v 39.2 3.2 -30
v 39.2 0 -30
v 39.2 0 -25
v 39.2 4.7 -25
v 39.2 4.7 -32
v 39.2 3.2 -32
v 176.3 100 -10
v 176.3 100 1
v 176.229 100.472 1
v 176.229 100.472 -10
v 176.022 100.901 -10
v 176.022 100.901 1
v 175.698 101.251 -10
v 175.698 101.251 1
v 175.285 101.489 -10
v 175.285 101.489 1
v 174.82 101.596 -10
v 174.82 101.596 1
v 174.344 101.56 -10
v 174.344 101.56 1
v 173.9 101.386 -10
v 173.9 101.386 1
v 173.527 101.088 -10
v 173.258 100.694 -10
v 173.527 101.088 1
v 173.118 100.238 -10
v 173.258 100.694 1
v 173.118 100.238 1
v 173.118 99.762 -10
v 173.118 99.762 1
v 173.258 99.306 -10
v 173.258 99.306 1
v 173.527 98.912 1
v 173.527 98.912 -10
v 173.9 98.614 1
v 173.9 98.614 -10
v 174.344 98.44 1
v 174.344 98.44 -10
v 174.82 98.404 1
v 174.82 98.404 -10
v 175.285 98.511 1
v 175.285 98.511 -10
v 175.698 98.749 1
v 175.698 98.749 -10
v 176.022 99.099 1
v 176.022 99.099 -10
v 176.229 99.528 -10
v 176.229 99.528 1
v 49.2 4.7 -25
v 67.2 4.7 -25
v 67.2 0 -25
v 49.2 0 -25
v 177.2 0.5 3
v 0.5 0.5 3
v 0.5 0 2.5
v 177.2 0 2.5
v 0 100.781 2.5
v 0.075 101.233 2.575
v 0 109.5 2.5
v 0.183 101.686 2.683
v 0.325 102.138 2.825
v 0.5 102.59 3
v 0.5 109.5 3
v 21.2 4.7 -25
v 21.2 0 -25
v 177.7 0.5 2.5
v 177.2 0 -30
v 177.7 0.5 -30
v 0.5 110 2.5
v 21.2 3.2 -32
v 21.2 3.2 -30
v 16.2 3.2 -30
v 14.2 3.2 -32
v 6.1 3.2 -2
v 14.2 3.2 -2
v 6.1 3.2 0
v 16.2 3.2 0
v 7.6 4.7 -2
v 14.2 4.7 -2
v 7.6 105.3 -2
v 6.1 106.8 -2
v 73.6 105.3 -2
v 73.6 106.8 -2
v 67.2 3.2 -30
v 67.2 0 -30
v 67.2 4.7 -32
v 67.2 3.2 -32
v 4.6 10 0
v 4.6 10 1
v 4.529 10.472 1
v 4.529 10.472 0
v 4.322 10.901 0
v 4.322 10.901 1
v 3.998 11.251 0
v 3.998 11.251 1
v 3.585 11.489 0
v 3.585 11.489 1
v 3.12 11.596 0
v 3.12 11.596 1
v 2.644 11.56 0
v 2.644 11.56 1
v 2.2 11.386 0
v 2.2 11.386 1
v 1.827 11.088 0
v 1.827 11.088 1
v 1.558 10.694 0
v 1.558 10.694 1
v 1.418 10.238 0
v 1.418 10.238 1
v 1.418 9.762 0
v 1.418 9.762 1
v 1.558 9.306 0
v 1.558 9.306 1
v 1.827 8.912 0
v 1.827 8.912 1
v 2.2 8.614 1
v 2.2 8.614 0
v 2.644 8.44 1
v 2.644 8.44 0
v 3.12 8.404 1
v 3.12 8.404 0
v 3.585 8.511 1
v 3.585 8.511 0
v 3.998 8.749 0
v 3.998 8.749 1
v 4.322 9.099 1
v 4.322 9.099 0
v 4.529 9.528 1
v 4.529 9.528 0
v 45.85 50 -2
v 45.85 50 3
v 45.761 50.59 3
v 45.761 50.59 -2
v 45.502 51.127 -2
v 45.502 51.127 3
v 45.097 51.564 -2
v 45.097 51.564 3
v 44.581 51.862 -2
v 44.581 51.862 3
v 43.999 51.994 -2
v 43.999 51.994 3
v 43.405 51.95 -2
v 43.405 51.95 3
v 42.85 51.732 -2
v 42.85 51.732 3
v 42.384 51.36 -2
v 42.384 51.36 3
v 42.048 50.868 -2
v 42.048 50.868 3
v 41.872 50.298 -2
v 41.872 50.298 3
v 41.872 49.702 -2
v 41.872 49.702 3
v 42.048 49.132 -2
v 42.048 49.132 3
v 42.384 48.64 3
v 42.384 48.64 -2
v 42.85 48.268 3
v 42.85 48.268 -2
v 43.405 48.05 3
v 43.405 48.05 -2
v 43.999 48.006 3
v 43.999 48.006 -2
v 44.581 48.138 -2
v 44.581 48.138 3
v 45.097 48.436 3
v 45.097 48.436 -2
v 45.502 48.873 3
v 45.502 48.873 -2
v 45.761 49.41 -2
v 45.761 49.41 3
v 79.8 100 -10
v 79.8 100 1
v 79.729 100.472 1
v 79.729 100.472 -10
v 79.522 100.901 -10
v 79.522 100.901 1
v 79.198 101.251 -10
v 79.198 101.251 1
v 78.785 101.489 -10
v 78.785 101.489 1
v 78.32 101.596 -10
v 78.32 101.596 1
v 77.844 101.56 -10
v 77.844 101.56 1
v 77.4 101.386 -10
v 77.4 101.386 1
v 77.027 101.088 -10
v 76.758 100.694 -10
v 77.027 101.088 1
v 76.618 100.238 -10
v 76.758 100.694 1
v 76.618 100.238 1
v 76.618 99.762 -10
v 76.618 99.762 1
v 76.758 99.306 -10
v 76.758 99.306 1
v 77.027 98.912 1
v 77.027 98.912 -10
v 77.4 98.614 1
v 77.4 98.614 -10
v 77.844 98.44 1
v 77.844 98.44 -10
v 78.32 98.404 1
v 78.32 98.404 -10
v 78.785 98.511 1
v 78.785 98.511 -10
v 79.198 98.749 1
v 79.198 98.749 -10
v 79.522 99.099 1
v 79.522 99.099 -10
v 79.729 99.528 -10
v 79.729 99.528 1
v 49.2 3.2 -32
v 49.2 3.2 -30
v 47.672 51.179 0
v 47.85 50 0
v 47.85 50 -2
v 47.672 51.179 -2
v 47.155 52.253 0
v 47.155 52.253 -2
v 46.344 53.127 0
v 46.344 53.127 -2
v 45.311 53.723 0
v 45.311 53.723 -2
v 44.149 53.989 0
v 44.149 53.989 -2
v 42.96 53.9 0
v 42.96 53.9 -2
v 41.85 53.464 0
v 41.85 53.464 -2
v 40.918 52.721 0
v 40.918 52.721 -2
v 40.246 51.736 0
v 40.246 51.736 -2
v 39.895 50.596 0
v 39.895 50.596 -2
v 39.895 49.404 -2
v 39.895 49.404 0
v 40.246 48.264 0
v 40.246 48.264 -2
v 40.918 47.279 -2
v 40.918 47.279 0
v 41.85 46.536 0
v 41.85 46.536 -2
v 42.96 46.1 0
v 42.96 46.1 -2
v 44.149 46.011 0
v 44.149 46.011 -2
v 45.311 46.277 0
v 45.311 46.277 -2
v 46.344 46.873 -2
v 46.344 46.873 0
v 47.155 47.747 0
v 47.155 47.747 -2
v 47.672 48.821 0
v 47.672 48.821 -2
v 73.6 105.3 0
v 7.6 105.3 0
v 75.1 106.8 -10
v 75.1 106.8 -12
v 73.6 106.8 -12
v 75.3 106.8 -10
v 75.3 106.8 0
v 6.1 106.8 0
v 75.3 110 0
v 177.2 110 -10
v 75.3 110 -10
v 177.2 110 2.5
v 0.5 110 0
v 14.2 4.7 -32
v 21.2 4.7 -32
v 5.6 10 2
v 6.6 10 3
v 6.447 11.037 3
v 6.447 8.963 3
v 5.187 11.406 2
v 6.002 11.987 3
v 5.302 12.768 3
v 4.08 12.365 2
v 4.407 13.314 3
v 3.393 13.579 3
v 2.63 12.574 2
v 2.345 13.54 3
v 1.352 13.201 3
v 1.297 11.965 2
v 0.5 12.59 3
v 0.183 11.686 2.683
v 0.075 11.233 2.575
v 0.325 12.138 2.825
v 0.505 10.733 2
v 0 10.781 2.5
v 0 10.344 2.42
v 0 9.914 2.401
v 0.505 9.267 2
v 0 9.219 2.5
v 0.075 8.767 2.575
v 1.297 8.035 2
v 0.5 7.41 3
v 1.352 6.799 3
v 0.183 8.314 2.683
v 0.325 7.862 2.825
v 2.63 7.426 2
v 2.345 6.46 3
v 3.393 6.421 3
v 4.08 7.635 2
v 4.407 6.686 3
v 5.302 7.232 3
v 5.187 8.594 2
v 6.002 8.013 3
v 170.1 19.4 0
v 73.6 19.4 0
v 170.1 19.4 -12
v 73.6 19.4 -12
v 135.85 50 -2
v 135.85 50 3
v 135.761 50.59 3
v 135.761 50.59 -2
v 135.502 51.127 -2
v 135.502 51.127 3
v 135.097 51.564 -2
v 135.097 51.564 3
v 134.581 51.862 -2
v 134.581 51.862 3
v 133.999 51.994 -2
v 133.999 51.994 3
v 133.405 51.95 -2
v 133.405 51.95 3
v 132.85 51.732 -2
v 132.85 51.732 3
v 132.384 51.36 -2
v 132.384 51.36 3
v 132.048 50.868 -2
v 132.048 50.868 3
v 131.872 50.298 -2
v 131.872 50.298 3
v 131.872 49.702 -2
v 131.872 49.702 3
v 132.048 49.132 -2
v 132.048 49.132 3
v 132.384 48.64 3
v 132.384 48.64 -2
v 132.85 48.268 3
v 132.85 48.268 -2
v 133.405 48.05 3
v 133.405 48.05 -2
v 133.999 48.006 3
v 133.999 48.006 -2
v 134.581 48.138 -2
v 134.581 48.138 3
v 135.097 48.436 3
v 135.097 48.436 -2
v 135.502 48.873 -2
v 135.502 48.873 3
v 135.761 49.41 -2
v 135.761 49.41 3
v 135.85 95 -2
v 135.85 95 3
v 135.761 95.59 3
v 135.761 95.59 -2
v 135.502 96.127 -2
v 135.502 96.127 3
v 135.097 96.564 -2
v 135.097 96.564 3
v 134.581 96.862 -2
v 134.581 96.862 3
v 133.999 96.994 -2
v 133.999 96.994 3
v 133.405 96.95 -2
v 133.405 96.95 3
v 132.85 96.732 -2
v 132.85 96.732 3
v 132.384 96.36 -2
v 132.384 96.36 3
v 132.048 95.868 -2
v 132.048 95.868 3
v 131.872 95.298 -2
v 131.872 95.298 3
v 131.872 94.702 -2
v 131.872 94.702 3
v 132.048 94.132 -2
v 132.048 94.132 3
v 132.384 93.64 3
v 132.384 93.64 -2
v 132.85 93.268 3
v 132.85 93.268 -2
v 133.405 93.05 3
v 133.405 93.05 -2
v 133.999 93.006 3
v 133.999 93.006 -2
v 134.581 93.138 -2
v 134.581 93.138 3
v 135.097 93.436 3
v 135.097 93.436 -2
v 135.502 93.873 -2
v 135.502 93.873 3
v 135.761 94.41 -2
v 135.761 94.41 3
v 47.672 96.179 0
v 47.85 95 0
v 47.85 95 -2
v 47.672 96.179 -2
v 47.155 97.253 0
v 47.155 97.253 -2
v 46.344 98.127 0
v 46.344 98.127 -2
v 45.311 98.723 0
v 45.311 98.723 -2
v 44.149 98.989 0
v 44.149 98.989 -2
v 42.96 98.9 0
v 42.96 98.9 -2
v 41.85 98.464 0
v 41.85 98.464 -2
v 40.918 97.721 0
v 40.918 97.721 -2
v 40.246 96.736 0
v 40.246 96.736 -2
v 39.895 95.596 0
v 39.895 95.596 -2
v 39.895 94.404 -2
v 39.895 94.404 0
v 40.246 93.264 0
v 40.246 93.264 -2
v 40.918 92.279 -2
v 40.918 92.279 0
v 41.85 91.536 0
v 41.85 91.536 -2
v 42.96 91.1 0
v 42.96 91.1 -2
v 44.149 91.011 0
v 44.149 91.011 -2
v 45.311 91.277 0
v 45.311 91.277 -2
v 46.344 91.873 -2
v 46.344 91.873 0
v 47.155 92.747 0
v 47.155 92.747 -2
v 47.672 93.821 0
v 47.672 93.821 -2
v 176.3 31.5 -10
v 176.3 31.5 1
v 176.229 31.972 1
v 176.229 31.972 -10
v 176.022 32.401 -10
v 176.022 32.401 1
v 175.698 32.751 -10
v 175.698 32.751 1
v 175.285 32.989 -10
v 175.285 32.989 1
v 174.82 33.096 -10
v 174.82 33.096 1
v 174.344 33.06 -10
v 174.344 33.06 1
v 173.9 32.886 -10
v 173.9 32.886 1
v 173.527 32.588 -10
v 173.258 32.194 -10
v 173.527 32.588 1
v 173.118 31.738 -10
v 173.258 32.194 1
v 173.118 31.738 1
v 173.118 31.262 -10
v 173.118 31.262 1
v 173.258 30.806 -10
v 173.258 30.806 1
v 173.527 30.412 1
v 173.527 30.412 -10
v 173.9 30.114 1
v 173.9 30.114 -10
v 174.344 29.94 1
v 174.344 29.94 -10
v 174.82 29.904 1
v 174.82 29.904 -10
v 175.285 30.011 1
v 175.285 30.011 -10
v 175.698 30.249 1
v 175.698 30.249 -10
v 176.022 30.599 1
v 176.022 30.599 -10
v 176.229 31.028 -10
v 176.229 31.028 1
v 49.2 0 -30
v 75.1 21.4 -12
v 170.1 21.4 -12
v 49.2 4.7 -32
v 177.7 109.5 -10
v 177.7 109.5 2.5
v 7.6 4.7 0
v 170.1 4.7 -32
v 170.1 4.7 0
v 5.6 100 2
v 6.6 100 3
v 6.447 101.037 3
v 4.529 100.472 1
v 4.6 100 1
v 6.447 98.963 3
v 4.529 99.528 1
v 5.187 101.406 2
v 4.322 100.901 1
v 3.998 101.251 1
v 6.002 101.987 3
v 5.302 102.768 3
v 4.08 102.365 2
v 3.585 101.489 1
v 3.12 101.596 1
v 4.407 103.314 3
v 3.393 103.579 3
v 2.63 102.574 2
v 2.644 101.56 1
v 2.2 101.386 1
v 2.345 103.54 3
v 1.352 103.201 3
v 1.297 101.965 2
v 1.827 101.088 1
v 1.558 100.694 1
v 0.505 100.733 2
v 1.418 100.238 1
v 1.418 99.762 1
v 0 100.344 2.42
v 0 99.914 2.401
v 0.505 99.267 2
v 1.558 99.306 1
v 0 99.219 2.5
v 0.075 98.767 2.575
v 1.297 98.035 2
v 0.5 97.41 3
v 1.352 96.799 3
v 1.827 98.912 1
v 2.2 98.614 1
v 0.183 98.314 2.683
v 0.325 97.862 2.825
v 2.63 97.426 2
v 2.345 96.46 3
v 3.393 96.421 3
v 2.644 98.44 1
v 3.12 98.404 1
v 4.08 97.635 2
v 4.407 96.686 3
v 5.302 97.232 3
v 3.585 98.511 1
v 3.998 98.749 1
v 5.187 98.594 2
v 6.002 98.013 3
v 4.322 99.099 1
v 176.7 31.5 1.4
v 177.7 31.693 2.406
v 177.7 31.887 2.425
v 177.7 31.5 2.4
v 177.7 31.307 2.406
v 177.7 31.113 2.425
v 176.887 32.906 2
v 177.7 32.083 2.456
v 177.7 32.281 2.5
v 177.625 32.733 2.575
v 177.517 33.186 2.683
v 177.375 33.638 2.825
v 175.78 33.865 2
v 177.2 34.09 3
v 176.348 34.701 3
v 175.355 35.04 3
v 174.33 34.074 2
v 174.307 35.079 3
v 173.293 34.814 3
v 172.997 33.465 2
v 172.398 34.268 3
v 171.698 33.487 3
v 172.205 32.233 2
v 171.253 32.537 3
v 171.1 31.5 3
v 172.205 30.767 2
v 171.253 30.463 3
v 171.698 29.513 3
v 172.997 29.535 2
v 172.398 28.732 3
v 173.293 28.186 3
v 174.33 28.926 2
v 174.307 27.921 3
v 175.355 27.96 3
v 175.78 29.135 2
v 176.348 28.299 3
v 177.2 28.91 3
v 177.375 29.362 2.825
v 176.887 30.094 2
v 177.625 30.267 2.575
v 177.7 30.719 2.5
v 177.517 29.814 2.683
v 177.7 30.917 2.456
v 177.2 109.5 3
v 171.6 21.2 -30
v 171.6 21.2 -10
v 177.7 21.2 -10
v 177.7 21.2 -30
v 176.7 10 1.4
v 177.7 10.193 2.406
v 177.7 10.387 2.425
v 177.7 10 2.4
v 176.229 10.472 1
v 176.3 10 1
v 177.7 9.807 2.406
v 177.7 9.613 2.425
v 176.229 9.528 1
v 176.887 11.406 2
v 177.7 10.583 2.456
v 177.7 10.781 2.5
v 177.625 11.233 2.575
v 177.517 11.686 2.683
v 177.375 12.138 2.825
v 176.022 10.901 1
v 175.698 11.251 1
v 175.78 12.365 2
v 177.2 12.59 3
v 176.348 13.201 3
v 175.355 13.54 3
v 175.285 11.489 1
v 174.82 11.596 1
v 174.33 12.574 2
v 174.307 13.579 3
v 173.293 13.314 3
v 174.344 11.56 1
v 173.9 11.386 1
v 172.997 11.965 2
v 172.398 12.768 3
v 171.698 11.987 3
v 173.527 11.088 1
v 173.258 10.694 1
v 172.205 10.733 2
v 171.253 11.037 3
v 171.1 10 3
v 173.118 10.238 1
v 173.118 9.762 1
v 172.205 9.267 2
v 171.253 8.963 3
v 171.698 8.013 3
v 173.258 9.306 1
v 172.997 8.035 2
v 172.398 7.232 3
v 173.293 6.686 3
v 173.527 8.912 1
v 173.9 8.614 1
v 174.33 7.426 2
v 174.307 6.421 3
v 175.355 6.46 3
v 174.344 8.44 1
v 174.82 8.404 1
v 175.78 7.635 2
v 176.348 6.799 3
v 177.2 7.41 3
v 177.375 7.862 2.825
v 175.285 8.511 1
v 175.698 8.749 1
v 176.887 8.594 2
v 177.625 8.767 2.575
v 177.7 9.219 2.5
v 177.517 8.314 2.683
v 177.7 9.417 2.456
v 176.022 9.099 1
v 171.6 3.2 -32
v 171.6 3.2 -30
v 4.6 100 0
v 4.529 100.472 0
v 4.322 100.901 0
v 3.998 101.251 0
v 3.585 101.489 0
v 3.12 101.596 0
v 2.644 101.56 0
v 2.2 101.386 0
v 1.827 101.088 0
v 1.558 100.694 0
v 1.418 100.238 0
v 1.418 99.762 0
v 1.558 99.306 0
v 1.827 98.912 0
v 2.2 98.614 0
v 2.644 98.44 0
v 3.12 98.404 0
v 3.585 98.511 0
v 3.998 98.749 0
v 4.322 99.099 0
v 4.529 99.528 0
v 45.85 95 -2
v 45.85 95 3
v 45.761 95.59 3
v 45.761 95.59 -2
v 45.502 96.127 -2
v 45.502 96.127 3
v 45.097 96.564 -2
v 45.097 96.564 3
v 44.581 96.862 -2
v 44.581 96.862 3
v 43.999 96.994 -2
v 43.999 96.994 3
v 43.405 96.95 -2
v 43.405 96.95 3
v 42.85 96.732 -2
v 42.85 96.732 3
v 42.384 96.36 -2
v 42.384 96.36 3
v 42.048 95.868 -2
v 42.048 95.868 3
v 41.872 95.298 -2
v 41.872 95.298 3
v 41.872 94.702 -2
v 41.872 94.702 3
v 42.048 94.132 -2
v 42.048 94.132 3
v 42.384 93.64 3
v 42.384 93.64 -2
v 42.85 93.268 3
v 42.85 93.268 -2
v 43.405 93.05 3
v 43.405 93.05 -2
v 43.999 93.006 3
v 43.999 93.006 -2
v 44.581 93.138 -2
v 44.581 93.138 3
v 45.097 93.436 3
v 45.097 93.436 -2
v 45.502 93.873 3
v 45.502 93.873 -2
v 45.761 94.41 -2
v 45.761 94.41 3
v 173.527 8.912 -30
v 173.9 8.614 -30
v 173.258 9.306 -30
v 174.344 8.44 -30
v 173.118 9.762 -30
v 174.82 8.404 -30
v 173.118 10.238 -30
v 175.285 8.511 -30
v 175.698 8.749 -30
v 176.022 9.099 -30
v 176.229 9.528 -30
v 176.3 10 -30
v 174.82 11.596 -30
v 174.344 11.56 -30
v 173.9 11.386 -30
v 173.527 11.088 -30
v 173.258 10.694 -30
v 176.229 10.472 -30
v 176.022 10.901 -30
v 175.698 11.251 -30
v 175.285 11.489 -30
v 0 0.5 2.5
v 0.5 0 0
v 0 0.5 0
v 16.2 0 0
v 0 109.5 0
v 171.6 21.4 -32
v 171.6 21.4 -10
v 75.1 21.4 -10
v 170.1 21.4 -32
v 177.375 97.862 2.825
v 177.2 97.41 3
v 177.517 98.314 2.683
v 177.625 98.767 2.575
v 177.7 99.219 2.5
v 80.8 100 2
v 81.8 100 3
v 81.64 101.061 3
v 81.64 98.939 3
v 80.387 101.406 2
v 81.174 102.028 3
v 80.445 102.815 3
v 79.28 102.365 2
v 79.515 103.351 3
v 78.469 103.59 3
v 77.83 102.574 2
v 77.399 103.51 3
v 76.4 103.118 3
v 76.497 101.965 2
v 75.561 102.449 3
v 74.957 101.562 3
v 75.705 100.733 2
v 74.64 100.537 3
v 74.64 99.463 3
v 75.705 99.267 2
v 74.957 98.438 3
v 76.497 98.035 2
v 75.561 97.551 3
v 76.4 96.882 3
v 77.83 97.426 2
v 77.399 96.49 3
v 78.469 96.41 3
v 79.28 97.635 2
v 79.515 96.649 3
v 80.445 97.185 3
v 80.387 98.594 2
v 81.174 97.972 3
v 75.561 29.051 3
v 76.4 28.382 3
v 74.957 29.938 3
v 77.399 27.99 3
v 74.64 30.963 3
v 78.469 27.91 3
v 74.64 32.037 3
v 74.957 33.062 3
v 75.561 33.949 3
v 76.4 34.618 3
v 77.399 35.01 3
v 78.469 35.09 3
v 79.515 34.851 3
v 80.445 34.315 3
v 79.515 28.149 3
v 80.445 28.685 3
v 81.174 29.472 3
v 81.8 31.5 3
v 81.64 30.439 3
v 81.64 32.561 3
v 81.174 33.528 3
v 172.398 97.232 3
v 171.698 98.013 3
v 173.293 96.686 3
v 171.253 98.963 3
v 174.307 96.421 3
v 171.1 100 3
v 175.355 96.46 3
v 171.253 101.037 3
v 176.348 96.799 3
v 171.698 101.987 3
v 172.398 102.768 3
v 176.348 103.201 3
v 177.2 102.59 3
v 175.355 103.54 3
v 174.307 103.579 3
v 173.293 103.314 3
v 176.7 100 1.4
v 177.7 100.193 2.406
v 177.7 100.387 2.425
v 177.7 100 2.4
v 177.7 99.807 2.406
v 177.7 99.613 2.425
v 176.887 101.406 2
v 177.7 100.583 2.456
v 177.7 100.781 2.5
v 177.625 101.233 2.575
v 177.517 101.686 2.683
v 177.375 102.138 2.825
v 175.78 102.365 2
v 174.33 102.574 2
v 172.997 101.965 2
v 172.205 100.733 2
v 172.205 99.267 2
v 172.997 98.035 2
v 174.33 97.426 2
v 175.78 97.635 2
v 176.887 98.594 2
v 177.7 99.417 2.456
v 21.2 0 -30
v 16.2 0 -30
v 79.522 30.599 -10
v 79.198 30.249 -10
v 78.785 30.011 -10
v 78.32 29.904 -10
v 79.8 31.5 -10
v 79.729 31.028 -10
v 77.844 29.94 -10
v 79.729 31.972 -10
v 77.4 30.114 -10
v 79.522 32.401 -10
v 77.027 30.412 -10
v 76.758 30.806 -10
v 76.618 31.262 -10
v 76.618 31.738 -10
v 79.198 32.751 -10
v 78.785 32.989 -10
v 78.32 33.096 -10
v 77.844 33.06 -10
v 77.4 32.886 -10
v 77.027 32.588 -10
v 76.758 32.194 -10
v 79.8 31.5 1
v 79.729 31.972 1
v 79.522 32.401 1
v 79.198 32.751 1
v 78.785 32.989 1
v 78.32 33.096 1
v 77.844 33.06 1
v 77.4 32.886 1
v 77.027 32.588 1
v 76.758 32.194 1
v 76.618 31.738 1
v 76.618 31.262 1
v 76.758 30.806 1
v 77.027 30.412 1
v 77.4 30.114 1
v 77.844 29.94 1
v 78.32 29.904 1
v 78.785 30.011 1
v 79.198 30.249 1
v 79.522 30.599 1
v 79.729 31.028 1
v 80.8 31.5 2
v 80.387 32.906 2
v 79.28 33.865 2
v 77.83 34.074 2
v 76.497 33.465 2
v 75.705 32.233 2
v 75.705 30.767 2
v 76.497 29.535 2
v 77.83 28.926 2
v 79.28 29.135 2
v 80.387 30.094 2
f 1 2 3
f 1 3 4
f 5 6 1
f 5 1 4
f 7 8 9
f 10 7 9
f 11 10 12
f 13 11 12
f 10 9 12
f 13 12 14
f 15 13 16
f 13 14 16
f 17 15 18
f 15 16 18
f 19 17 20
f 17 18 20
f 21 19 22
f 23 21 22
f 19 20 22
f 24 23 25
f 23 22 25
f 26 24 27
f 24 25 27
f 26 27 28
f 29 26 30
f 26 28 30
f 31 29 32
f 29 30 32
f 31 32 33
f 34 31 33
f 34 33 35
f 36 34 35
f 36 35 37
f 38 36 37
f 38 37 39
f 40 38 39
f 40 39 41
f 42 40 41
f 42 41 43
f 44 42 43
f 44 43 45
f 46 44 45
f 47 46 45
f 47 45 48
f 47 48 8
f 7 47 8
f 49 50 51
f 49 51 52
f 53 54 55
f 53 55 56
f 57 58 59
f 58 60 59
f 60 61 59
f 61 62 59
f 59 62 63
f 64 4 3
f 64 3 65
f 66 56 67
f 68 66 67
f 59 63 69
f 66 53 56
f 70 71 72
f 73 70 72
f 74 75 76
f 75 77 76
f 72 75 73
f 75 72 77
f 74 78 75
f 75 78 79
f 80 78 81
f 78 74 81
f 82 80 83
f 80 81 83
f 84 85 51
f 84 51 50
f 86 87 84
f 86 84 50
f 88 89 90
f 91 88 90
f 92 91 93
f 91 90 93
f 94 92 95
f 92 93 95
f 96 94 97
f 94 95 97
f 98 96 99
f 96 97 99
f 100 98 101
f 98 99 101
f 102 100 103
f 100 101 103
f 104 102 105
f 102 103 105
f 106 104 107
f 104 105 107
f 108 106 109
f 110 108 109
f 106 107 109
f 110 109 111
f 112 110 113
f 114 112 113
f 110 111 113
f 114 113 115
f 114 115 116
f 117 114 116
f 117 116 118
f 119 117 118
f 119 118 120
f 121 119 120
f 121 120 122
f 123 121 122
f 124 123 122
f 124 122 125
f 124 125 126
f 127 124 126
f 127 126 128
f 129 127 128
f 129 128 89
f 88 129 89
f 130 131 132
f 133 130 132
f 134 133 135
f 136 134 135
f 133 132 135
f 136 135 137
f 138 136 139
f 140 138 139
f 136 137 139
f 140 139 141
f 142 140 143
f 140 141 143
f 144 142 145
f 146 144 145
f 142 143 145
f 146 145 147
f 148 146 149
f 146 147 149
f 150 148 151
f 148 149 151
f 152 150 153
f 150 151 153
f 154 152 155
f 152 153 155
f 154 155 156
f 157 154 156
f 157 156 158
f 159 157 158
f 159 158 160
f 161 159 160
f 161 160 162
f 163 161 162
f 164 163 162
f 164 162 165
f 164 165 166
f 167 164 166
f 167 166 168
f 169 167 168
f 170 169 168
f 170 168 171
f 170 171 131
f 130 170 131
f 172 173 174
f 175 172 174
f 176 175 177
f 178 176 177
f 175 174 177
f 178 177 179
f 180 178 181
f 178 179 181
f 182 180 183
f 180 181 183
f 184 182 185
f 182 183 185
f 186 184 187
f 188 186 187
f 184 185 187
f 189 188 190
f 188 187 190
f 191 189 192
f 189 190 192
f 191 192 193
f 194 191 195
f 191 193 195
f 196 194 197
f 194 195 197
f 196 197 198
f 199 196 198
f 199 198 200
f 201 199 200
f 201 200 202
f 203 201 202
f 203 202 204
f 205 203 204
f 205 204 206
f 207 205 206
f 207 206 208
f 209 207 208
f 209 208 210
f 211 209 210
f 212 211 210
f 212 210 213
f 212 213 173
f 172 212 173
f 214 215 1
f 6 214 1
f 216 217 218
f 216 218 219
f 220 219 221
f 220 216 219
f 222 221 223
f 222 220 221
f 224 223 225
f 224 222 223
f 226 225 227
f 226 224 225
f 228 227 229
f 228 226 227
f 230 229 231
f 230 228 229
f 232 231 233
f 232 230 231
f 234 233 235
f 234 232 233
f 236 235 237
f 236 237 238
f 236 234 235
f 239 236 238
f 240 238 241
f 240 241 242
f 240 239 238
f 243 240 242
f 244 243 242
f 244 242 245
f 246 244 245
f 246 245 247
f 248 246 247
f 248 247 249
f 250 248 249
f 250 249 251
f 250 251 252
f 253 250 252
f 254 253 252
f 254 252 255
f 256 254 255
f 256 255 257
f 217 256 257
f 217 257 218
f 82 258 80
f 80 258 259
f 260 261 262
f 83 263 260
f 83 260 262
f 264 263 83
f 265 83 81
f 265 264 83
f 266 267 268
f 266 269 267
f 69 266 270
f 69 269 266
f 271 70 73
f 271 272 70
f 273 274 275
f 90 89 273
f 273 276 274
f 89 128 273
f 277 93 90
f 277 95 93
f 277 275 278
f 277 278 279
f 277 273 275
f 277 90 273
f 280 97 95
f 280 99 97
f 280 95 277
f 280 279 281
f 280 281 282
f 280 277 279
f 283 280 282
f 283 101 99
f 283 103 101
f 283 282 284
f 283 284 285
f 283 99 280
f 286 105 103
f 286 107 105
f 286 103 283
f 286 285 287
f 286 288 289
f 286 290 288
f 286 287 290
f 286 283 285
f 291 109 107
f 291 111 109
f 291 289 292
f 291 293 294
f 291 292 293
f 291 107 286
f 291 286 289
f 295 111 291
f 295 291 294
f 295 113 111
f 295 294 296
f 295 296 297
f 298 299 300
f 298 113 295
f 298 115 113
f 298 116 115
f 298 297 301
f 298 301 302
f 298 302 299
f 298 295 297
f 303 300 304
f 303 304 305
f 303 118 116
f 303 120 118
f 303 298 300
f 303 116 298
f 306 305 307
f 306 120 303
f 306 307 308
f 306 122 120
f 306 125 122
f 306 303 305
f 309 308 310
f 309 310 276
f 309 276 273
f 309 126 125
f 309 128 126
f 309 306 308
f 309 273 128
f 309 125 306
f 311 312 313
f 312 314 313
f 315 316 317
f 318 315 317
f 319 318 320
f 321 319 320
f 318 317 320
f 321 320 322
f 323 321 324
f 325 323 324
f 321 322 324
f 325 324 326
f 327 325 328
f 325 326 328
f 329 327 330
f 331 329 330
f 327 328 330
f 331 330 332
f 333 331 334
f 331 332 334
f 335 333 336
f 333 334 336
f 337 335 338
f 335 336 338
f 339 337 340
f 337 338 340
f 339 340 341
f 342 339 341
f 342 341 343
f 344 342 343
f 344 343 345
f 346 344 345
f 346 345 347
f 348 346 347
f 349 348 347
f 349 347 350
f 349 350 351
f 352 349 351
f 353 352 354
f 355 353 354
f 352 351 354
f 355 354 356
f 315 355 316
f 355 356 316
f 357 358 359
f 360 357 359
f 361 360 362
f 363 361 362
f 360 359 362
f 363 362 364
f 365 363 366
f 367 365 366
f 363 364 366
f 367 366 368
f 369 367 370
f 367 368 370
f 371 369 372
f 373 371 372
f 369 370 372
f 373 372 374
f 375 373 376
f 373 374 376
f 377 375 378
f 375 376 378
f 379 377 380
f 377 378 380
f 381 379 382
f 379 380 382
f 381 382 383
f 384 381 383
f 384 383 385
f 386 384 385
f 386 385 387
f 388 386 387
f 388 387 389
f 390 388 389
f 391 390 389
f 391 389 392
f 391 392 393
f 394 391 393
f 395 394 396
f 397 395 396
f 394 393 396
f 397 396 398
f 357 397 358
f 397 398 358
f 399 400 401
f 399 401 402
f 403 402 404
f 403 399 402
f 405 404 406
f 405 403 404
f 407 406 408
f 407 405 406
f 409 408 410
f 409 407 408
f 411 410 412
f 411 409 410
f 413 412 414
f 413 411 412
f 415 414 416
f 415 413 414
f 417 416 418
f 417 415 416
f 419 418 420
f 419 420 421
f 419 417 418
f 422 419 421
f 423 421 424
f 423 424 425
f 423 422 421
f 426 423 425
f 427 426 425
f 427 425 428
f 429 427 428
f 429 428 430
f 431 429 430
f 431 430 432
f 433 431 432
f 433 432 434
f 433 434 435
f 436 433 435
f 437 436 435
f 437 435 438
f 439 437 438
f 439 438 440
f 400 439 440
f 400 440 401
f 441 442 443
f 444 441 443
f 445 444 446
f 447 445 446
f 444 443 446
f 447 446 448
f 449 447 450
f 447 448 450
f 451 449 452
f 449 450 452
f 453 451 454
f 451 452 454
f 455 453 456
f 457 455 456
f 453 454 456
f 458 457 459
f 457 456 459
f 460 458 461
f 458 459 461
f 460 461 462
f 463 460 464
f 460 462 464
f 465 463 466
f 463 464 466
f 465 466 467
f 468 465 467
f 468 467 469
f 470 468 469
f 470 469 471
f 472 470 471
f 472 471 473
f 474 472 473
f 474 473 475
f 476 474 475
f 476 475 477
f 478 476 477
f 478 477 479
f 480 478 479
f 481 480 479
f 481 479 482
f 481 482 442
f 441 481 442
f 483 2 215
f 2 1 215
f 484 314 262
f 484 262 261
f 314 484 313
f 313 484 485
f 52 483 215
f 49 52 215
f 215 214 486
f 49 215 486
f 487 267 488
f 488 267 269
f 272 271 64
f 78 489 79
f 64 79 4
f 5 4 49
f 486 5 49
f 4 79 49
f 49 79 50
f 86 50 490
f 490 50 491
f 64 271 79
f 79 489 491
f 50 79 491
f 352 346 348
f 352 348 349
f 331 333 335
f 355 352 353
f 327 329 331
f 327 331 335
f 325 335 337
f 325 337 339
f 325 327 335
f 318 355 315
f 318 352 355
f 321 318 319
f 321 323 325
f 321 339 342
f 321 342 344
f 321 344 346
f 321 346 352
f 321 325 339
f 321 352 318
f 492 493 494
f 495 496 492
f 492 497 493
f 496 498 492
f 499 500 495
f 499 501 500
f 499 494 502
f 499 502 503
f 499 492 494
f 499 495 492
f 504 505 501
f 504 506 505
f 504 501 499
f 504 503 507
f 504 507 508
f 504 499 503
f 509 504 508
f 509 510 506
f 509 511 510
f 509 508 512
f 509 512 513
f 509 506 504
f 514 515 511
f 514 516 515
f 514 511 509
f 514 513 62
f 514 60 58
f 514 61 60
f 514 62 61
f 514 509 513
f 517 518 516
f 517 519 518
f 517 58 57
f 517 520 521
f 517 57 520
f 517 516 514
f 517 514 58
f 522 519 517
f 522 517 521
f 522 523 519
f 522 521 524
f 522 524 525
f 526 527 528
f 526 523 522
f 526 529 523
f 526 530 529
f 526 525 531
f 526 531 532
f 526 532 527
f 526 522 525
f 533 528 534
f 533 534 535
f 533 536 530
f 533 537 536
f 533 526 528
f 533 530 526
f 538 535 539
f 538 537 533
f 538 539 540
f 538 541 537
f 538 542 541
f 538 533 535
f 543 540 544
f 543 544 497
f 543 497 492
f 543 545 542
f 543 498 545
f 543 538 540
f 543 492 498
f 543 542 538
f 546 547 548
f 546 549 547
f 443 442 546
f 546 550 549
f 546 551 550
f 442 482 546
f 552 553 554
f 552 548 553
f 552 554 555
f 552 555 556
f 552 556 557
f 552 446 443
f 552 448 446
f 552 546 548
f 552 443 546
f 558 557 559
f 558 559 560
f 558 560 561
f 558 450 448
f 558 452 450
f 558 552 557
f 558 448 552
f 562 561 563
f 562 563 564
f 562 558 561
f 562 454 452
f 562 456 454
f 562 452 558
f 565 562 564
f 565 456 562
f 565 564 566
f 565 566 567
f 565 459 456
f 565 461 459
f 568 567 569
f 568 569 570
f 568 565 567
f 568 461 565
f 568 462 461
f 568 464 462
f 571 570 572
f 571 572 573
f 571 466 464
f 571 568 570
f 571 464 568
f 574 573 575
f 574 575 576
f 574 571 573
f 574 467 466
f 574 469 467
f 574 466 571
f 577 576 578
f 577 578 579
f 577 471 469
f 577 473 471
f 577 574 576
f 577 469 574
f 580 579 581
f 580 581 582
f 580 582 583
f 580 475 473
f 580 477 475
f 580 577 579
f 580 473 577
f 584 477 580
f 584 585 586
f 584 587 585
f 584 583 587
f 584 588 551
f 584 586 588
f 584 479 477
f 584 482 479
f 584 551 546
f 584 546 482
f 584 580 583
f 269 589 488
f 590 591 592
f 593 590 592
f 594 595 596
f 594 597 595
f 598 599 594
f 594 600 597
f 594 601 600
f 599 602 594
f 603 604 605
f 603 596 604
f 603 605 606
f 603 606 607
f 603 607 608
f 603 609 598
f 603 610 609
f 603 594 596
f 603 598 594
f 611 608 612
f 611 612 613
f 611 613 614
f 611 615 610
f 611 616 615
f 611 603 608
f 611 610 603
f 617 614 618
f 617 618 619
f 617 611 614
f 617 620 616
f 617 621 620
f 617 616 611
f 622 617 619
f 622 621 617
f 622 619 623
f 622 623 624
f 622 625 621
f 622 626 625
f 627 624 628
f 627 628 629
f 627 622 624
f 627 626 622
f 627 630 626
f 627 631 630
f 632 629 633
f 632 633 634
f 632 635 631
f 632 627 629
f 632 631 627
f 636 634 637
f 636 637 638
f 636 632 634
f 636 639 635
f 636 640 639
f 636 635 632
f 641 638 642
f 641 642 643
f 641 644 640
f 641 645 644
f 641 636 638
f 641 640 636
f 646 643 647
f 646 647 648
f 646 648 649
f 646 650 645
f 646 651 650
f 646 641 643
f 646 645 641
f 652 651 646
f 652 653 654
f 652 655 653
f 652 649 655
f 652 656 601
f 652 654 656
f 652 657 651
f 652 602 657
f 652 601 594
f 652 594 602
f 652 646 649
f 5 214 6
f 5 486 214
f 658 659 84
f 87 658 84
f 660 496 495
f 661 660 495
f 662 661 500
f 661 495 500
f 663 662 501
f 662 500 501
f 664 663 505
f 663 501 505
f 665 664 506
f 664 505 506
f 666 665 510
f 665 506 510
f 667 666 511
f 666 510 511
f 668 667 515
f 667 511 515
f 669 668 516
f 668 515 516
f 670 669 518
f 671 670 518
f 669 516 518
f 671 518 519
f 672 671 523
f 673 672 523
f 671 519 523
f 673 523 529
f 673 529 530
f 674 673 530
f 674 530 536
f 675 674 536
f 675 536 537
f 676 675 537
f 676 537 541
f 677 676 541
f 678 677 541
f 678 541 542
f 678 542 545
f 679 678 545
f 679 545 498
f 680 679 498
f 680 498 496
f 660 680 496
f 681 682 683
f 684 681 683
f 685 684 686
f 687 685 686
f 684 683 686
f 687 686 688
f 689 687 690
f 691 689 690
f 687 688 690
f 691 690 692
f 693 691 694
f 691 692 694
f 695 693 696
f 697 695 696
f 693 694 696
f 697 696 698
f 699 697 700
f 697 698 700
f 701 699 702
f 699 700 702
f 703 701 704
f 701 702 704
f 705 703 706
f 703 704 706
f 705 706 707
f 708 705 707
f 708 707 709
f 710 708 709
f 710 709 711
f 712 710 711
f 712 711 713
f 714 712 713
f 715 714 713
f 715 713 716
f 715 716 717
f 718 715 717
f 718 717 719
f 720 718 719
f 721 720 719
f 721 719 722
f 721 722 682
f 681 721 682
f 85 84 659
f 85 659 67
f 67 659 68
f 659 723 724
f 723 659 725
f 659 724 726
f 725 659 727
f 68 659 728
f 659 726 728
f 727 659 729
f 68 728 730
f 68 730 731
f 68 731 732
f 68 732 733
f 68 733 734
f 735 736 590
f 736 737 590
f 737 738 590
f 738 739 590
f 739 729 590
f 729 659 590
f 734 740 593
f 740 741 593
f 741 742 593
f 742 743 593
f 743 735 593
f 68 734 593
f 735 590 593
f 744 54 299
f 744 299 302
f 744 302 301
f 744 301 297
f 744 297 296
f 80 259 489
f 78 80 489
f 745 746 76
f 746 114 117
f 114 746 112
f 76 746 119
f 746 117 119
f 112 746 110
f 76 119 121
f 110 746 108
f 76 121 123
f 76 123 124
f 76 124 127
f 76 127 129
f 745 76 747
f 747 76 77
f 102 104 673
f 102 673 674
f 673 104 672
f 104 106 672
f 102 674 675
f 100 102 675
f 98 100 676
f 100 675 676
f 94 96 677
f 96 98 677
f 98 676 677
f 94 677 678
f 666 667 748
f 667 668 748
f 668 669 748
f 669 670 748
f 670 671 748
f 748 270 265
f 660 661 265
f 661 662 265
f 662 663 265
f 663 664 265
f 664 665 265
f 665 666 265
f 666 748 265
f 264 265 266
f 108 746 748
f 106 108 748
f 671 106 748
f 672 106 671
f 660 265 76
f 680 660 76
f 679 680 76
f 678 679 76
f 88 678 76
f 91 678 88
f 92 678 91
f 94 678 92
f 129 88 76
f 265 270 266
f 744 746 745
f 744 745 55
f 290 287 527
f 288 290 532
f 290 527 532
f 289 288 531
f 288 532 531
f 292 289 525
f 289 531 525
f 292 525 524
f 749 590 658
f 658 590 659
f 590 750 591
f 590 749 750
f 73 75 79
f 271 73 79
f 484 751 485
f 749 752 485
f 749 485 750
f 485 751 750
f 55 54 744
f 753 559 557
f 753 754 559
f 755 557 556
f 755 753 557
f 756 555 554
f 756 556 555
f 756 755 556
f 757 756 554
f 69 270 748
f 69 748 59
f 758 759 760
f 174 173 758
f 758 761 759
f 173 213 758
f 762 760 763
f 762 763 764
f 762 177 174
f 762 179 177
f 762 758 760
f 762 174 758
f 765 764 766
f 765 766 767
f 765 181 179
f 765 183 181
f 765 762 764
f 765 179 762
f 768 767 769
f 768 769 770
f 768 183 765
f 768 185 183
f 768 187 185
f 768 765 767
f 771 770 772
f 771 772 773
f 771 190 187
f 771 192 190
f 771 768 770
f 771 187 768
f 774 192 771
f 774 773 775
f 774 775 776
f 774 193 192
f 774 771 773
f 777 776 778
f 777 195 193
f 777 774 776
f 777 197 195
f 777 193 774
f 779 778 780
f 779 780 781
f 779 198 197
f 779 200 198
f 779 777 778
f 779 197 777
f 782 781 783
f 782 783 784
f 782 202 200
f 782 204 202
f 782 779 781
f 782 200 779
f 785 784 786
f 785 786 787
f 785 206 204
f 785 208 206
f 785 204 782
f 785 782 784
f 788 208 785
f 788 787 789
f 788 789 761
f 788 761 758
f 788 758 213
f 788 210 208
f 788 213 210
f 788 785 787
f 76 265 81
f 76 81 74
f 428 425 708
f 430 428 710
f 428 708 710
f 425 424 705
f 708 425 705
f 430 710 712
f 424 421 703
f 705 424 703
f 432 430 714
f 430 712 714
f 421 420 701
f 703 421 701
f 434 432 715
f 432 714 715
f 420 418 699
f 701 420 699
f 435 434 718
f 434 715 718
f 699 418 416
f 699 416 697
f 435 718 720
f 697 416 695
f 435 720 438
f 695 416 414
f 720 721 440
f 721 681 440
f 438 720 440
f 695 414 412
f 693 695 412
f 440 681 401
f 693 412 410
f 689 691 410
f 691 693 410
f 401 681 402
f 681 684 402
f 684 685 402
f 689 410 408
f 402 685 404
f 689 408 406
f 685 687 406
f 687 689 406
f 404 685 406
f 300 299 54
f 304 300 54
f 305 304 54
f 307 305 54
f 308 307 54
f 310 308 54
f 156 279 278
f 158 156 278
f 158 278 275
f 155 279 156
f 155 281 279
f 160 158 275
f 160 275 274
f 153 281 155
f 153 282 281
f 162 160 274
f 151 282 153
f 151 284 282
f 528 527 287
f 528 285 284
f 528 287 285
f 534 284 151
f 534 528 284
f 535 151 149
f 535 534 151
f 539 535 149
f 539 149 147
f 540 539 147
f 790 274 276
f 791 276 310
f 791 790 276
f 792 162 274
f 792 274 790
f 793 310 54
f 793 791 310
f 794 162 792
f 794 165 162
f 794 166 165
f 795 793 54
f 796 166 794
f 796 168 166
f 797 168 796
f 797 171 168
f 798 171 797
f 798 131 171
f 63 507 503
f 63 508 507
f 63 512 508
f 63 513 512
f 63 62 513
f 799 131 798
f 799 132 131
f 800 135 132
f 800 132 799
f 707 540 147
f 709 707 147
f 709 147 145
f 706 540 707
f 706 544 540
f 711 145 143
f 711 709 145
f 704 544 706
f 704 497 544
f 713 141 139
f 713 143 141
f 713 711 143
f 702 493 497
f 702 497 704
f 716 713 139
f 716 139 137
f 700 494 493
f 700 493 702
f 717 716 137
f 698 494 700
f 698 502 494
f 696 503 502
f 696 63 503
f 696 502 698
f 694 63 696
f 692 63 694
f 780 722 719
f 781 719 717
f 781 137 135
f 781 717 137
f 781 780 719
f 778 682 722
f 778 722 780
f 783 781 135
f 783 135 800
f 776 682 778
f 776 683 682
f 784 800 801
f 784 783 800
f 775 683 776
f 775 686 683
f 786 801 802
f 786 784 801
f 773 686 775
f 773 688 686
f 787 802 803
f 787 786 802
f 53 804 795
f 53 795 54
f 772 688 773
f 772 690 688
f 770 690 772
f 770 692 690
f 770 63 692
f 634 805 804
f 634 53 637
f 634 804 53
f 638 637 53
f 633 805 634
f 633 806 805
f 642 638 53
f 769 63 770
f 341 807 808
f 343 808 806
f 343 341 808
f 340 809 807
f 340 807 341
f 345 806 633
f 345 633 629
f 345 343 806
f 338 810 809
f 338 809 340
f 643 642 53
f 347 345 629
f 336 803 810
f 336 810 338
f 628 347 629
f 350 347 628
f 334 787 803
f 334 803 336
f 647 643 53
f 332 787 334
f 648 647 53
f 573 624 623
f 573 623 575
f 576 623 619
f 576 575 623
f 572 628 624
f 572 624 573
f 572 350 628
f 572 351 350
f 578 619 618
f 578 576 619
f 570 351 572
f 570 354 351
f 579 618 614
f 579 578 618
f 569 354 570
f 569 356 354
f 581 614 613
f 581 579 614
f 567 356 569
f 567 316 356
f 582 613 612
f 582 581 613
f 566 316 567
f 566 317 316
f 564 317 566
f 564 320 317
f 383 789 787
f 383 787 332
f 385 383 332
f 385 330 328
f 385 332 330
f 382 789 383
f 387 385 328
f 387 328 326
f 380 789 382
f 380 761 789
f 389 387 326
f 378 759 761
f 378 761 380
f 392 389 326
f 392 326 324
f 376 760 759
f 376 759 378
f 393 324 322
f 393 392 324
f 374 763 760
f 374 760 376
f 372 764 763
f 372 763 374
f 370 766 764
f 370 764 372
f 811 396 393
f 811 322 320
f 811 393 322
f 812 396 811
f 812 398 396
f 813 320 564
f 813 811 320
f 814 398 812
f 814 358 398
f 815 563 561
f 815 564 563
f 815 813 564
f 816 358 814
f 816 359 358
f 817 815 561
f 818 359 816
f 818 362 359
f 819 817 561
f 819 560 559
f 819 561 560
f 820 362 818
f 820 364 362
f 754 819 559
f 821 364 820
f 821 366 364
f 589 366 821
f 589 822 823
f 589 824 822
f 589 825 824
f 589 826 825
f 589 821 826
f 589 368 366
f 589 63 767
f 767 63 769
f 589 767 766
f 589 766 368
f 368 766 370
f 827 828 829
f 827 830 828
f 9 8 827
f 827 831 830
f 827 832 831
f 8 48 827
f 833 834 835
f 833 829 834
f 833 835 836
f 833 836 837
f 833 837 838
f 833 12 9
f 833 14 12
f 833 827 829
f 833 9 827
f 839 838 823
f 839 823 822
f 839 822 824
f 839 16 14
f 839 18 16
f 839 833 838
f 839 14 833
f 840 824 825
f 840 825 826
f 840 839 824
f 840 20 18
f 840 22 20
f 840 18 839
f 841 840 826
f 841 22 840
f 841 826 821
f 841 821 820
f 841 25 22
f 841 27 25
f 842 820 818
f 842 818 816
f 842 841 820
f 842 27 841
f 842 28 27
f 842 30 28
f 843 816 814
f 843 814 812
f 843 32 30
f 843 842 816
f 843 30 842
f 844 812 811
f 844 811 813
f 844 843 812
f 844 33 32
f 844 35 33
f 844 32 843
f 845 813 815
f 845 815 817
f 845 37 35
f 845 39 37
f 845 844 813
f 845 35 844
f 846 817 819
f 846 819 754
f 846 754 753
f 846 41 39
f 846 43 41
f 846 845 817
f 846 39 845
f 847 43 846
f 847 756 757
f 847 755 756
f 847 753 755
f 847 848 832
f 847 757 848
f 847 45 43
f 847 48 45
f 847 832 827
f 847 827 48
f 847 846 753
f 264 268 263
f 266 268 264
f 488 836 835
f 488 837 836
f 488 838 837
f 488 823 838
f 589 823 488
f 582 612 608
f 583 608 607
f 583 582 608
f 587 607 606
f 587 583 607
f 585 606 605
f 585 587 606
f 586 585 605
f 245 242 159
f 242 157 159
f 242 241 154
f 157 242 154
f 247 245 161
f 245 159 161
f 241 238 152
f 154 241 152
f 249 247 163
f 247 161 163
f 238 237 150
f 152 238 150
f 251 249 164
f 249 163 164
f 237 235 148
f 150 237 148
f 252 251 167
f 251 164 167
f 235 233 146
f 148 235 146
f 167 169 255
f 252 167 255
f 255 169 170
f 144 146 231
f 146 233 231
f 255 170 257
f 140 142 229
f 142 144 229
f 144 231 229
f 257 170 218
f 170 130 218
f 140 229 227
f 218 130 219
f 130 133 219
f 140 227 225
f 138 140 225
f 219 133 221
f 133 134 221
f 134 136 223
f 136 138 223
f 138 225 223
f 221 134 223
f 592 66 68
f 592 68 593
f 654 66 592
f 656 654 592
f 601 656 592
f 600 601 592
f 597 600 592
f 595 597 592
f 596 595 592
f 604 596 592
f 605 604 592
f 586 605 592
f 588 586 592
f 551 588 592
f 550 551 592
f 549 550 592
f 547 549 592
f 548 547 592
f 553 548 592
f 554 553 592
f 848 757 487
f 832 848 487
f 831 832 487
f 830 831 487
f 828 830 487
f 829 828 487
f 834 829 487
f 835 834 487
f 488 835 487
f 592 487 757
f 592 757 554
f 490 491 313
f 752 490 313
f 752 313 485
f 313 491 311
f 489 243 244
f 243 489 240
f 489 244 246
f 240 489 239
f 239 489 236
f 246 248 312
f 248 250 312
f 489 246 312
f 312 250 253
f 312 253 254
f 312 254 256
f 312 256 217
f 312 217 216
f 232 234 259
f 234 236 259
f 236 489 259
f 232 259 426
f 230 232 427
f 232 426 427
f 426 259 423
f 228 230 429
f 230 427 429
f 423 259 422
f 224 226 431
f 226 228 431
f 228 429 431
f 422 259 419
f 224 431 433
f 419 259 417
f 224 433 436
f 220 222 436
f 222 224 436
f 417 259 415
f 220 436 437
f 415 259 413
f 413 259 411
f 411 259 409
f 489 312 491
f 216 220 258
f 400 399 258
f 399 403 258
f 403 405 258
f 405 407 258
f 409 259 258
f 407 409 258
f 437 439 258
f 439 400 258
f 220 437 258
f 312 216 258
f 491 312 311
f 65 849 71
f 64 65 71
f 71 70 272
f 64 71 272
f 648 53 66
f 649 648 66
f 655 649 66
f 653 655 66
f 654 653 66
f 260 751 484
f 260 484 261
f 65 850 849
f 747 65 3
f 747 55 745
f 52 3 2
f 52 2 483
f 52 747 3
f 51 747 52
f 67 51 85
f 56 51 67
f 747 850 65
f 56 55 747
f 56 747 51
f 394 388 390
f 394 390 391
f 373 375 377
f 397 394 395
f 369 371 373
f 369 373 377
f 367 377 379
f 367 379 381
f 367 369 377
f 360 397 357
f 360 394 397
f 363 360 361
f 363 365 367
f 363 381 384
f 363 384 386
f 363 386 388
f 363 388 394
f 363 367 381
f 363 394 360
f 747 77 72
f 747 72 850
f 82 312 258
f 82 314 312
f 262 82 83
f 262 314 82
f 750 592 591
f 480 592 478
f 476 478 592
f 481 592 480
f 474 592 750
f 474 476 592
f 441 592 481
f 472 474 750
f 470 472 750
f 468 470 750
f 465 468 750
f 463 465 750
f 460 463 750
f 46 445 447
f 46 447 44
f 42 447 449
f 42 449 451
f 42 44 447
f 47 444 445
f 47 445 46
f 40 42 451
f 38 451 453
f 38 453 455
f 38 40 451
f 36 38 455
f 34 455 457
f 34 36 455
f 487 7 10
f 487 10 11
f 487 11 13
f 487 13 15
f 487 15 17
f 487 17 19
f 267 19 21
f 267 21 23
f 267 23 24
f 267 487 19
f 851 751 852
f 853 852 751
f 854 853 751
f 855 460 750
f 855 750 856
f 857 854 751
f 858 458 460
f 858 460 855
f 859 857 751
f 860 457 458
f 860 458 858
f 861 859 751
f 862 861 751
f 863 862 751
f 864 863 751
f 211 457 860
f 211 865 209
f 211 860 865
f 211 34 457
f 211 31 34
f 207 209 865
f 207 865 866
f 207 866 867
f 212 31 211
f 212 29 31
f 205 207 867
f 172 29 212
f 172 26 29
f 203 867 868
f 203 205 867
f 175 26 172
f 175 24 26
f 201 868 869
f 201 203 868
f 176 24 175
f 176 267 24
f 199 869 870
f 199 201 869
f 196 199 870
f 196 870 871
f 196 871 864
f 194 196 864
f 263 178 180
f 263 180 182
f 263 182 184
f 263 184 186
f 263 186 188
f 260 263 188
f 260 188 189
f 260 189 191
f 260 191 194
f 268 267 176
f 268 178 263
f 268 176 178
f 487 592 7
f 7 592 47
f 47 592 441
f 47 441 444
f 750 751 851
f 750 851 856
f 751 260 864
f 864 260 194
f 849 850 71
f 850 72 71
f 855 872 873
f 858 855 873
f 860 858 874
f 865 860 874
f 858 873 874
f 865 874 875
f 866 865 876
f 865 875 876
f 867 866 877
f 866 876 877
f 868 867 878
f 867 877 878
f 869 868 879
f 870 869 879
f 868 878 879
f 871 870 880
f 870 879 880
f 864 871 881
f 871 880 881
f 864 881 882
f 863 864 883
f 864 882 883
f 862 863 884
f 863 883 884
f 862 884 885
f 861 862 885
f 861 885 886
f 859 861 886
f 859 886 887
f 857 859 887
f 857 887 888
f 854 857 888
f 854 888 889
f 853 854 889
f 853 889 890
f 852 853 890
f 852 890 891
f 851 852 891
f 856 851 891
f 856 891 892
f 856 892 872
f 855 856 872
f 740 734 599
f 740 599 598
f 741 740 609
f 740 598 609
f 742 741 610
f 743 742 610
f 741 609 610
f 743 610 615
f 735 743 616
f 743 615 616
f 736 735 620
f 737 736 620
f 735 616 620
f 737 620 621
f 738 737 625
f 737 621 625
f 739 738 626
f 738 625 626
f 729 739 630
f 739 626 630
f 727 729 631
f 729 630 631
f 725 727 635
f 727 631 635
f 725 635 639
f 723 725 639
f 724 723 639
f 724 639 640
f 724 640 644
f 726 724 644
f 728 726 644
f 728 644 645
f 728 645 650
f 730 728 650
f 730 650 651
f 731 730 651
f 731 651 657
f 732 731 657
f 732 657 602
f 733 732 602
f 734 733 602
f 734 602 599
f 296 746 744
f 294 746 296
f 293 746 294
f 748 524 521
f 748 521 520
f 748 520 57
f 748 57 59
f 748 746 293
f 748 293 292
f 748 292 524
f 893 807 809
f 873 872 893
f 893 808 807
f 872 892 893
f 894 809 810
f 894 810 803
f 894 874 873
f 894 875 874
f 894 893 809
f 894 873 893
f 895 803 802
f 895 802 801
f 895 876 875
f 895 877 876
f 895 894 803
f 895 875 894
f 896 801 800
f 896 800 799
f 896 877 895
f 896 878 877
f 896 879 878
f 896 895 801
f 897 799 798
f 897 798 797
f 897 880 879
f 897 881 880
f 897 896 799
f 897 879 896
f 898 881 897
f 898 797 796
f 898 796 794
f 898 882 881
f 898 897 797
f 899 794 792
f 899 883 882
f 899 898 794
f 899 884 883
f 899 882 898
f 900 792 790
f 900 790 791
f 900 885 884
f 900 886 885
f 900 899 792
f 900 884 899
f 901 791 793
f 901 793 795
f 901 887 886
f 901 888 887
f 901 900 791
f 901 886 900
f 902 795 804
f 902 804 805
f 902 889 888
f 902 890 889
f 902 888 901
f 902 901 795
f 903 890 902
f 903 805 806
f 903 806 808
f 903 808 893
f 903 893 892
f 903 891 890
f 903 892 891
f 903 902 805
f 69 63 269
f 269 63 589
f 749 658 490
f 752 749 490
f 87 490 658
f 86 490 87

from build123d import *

# Parameters (mm, degrees)
ESQUISSE1_W             = 177.7
ESQUISSE1_H             = 110
BOSS_EXTRU_1_DEPTH      = 3
ESQUISSE2_W             = 102.6
ESQUISSE2_H             = 88.6
BOSS_EXTRU_2_DEPTH      = 10
BOSS_EXTRU_3_DEPTH      = 30
ESQUISSE4_W             = 6.1
ESQUISSE4_H             = 20
ENL_V_MAT_EXTRU_1_DEPTH = 0.2
ESQUISSE5_W             = 10
ESQUISSE5_H             = 3.2
ENL_V_MAT_EXTRU_2_DEPTH = 0.2
BOSS_EXTRU_4_DEPTH      = 2
BOSS_EXTRU_5_DEPTH      = 10
BOSS_EXTRU_6_DEPTH      = 30
ESQUISSE9_R             = 1.6
ENL_V_MAT_EXTRU_3_DEPTH = 212.901604524
CHANFREIN1_SIZE         = 2
CHANFREIN2_SIZE         = 0.5
ESQUISSE10_R            = 2
ENL_V_MAT_EXTRU_4_DEPTH = 5
ESQUISSE11_R            = 4
ESQUISSE11_R_2          = 2
BOSS_EXTRU_7_DEPTH      = 5
ESQUISSE13_W            = 18
ESQUISSE13_H            = 4.7
ENL_V_MAT_EXTRU_5_DEPTH = 7
ESQUISSE14_W            = 96.5
ESQUISSE14_H            = 0.5
BOSS_EXTRU_8_DEPTH      = 2


with BuildPart() as part:
    # Esquisse1 → Boss.-Extru.1 (new body)
    with BuildSketch(Plane.XY):
        with Locations((88.85, 55)):
            Rectangle(ESQUISSE1_W, ESQUISSE1_H)
    extrude(amount=BOSS_EXTRU_1_DEPTH)

    # Esquisse2 → Boss.-Extru.2 (add)
    with BuildSketch(Plane(origin=(0, 0, 0), x_dir=(-1, 0, 0), z_dir=(0, 0, -1))):
        with Locations((-126.4, 65.7)):
            Rectangle(ESQUISSE2_W, ESQUISSE2_H)
    extrude(amount=BOSS_EXTRU_2_DEPTH)

    # Esquisse3 → Boss.-Extru.3 (add)
    with BuildSketch(Plane(origin=(0, 0, 0), x_dir=(-1, 0, 0), z_dir=(0, 0, -1))):
        Polygon((-177.7, 21.4), (-171.6, 21.4), (-171.6, 3.2), (-16.2, 3.2), (-16.2, 0), (-177.7, 0), align=None)
    extrude(amount=BOSS_EXTRU_3_DEPTH)

    # Esquisse4 → Enlèv. mat.-Extru.1 (cut)
    with BuildSketch(Plane(origin=(0, 21.4, 0), x_dir=(1, 0, 0), z_dir=(0, 1, 0))):
        with Locations((174.65, 20)):
            Rectangle(ESQUISSE4_W, ESQUISSE4_H)
    extrude(amount=-ENL_V_MAT_EXTRU_1_DEPTH, mode=Mode.SUBTRACT)

    # Esquisse5 → Enlèv. mat.-Extru.2 (cut)
    with BuildSketch(Plane.ZY.offset(-75.1)):
        with Locations((-5, 108.4)):
            Rectangle(ESQUISSE5_W, ESQUISSE5_H)
    extrude(amount=-ENL_V_MAT_EXTRU_2_DEPTH, mode=Mode.SUBTRACT)

    # Esquisse6 → Boss.-Extru.4 (add)
    with BuildSketch(Plane(origin=(0, 0, 0), x_dir=(-1, 0, 0), z_dir=(0, 0, -1))):
        Polygon((-75.1, 106.8), (-6.1, 106.8), (-6.1, 3.2), (-171.6, 3.2), (-171.6, 21.4), (-75.1, 21.4), align=None)
        Polygon((-73.6, 105.3), (-7.6, 105.3), (-7.6, 4.7), (-170.1, 4.7), (-170.1, 19.9), (-73.6, 19.9), align=None, mode=Mode.SUBTRACT)
    extrude(amount=BOSS_EXTRU_4_DEPTH)

    # Esquisse7 → Boss.-Extru.5 (add)
    with BuildSketch(Plane(origin=(0, 0, -2), x_dir=(-1, 0, 0), z_dir=(0, 0, -1))):
        Polygon((-75.1, 106.8), (-73.6, 106.8), (-73.6, 19.4), (-171.6, 19.4), (-171.6, 21.4), (-75.1, 21.4), align=None)
    extrude(amount=BOSS_EXTRU_5_DEPTH)

    # Esquisse8 → Boss.-Extru.6 (add)
    with BuildSketch(Plane(origin=(0, 0, -2), x_dir=(-1, 0, 0), z_dir=(0, 0, -1))):
        Polygon((-14.2, 3.2), (-14.2, 4.7), (-170.1, 4.7), (-170.1, 21.4), (-171.6, 21.4), (-171.6, 3.2), align=None)
    extrude(amount=BOSS_EXTRU_6_DEPTH)

    # Esquisse9 → Enlèv. mat.-Extru.3 (cut, through all)
    with BuildSketch(Plane.XY.offset(3)):
        with Locations((3, 100)):
            Circle(ESQUISSE9_R)
        with Locations((3, 10)):
            Circle(ESQUISSE9_R)
        with Locations((174.7, 100)):
            Circle(ESQUISSE9_R)
        with Locations((174.7, 10)):
            Circle(ESQUISSE9_R)
        with Locations((78.2, 100)):
            Circle(ESQUISSE9_R)
        with Locations((78.2, 31.5)):
            Circle(ESQUISSE9_R)
        with Locations((174.7, 31.5)):
            Circle(ESQUISSE9_R)
    extrude(amount=-ENL_V_MAT_EXTRU_3_DEPTH, mode=Mode.SUBTRACT)

    # Chanfrein1
    # the kernel refuses this chamfer: 2 mm, written as the material it takes off along each edge
    with BuildSketch(Plane(origin=(78.2, 100, 3), x_dir=(1, 0, 0), z_dir=(0, -1, 0))) as chanfrein1_piece_1:
        Polygon((1.6 + CHANFREIN1_SIZE, 0), (1.6, -CHANFREIN1_SIZE), (1.6, 0), align=None)
    revolve(axis=Axis((78.2, 100, 3), (0, 0, 1)), mode=Mode.SUBTRACT)
    with BuildSketch(Plane(origin=(174.7, 10, 3), x_dir=(1, 0, 0), z_dir=(0, -1, 0))) as chanfrein1_piece_2:
        Polygon((1.6 + CHANFREIN1_SIZE, 0), (1.6, -CHANFREIN1_SIZE), (1.6, 0), align=None)
    revolve(axis=Axis((174.7, 10, 3), (0, 0, 1)), mode=Mode.SUBTRACT)
    with BuildSketch(Plane(origin=(174.7, 100, 3), x_dir=(1, 0, 0), z_dir=(0, -1, 0))) as chanfrein1_piece_3:
        Polygon((1.6 + CHANFREIN1_SIZE, 0), (1.6, -CHANFREIN1_SIZE), (1.6, 0), align=None)
    revolve(axis=Axis((174.7, 100, 3), (0, 0, 1)), mode=Mode.SUBTRACT)
    with BuildSketch(Plane(origin=(3, 10, 3), x_dir=(1, 0, 0), z_dir=(0, -1, 0))) as chanfrein1_piece_4:
        Polygon((1.6 + CHANFREIN1_SIZE, 0), (1.6, -CHANFREIN1_SIZE), (1.6, 0), align=None)
    revolve(axis=Axis((3, 10, 3), (0, 0, 1)), mode=Mode.SUBTRACT)
    with BuildSketch(Plane(origin=(78.2, 31.5, 3), x_dir=(1, 0, 0), z_dir=(0, -1, 0))) as chanfrein1_piece_5:
        Polygon((1.6 + CHANFREIN1_SIZE, 0), (1.6, -CHANFREIN1_SIZE), (1.6, 0), align=None)
    revolve(axis=Axis((78.2, 31.5, 3), (0, 0, 1)), mode=Mode.SUBTRACT)
    with BuildSketch(Plane(origin=(174.7, 31.5, 3), x_dir=(1, 0, 0), z_dir=(0, -1, 0))) as chanfrein1_piece_6:
        Polygon((1.6 + CHANFREIN1_SIZE, 0), (1.6, -CHANFREIN1_SIZE), (1.6, 0), align=None)
    revolve(axis=Axis((174.7, 31.5, 3), (0, 0, 1)), mode=Mode.SUBTRACT)
    with BuildSketch(Plane(origin=(3, 100, 3), x_dir=(1, 0, 0), z_dir=(0, -1, 0))) as chanfrein1_piece_7:
        Polygon((1.6 + CHANFREIN1_SIZE, 0), (1.6, -CHANFREIN1_SIZE), (1.6, 0), align=None)
    revolve(axis=Axis((3, 100, 3), (0, 0, 1)), mode=Mode.SUBTRACT)

    # Chanfrein2
    chanfrein2_edges = [part.edges().sort_by_distance(p)[0] for p in [
        (177.7, 65.75, 3),
        (177.7, 20.75, 3),
        (0, 4.005012563, 3),
        (177.7, 4.005012563, 3),
        (88.85, 0, 3),
        (0, 55, 3),
        (177.7, 105.994987437, 3),
        (0, 105.994987437, 3),
        (88.85, 110, 3),
        (0, 0, 1.5),
        (177.7, 0, -13.5),
        (0, 110, 1.5),
        (177.7, 110, -3.5),
    ]]
    chamfer(chanfrein2_edges, length=CHANFREIN2_SIZE)

    # Esquisse10 → Enlèv. mat.-Extru.4 (cut)
    with BuildSketch(Plane.XY.offset(3)):
        with Locations((43.85, 95)):
            Circle(ESQUISSE10_R)
        with Locations((43.85, 50)):
            Circle(ESQUISSE10_R)
        with Locations((133.85, 95)):
            Circle(ESQUISSE10_R)
        with Locations((133.85, 50)):
            Circle(ESQUISSE10_R)
    extrude(amount=-ENL_V_MAT_EXTRU_4_DEPTH, mode=Mode.SUBTRACT)

    # Esquisse11 → Boss.-Extru.7 (add)
    # profile 1 of 4: a face of its own
    with BuildSketch(Plane.XY.offset(3)):
        with Locations((43.85, 95)):
            Circle(ESQUISSE11_R)
        with Locations((43.85, 95)):
            Circle(ESQUISSE11_R_2, mode=Mode.SUBTRACT)
    # profile 2 of 4: a face of its own
    with BuildSketch(Plane.XY.offset(3)):
        with Locations((43.85, 50)):
            Circle(ESQUISSE11_R)
        with Locations((43.85, 50)):
            Circle(ESQUISSE11_R_2, mode=Mode.SUBTRACT)
    # profile 3 of 4: a face of its own
    with BuildSketch(Plane.XY.offset(3)):
        with Locations((133.85, 95)):
            Circle(ESQUISSE11_R)
        with Locations((133.85, 95)):
            Circle(ESQUISSE11_R_2, mode=Mode.SUBTRACT)
    # profile 4 of 4: a face of its own
    with BuildSketch(Plane.XY.offset(3)):
        with Locations((133.85, 50)):
            Circle(ESQUISSE11_R)
        with Locations((133.85, 50)):
            Circle(ESQUISSE11_R_2, mode=Mode.SUBTRACT)
    extrude(amount=-BOSS_EXTRU_7_DEPTH)

    # Esquisse13 → Enlèv. mat.-Extru.5 (cut)
    with BuildSketch(Plane(origin=(0, 0, -32), x_dir=(-1, 0, 0), z_dir=(0, 0, -1))):
        with Locations((-30.2, 2.35)):
            Rectangle(ESQUISSE13_W, ESQUISSE13_H)
        with Locations((-58.2, 2.35)):
            Rectangle(ESQUISSE13_W, ESQUISSE13_H)
    extrude(amount=-ENL_V_MAT_EXTRU_5_DEPTH, mode=Mode.SUBTRACT)

    # Esquisse14 → Boss.-Extru.8 (add)
    with BuildSketch(Plane.XY.offset(-2)):
        with Locations((121.85, 19.65)):
            Rectangle(ESQUISSE14_W, ESQUISSE14_H)
    extrude(amount=BOSS_EXTRU_8_DEPTH)


solid = part.part
